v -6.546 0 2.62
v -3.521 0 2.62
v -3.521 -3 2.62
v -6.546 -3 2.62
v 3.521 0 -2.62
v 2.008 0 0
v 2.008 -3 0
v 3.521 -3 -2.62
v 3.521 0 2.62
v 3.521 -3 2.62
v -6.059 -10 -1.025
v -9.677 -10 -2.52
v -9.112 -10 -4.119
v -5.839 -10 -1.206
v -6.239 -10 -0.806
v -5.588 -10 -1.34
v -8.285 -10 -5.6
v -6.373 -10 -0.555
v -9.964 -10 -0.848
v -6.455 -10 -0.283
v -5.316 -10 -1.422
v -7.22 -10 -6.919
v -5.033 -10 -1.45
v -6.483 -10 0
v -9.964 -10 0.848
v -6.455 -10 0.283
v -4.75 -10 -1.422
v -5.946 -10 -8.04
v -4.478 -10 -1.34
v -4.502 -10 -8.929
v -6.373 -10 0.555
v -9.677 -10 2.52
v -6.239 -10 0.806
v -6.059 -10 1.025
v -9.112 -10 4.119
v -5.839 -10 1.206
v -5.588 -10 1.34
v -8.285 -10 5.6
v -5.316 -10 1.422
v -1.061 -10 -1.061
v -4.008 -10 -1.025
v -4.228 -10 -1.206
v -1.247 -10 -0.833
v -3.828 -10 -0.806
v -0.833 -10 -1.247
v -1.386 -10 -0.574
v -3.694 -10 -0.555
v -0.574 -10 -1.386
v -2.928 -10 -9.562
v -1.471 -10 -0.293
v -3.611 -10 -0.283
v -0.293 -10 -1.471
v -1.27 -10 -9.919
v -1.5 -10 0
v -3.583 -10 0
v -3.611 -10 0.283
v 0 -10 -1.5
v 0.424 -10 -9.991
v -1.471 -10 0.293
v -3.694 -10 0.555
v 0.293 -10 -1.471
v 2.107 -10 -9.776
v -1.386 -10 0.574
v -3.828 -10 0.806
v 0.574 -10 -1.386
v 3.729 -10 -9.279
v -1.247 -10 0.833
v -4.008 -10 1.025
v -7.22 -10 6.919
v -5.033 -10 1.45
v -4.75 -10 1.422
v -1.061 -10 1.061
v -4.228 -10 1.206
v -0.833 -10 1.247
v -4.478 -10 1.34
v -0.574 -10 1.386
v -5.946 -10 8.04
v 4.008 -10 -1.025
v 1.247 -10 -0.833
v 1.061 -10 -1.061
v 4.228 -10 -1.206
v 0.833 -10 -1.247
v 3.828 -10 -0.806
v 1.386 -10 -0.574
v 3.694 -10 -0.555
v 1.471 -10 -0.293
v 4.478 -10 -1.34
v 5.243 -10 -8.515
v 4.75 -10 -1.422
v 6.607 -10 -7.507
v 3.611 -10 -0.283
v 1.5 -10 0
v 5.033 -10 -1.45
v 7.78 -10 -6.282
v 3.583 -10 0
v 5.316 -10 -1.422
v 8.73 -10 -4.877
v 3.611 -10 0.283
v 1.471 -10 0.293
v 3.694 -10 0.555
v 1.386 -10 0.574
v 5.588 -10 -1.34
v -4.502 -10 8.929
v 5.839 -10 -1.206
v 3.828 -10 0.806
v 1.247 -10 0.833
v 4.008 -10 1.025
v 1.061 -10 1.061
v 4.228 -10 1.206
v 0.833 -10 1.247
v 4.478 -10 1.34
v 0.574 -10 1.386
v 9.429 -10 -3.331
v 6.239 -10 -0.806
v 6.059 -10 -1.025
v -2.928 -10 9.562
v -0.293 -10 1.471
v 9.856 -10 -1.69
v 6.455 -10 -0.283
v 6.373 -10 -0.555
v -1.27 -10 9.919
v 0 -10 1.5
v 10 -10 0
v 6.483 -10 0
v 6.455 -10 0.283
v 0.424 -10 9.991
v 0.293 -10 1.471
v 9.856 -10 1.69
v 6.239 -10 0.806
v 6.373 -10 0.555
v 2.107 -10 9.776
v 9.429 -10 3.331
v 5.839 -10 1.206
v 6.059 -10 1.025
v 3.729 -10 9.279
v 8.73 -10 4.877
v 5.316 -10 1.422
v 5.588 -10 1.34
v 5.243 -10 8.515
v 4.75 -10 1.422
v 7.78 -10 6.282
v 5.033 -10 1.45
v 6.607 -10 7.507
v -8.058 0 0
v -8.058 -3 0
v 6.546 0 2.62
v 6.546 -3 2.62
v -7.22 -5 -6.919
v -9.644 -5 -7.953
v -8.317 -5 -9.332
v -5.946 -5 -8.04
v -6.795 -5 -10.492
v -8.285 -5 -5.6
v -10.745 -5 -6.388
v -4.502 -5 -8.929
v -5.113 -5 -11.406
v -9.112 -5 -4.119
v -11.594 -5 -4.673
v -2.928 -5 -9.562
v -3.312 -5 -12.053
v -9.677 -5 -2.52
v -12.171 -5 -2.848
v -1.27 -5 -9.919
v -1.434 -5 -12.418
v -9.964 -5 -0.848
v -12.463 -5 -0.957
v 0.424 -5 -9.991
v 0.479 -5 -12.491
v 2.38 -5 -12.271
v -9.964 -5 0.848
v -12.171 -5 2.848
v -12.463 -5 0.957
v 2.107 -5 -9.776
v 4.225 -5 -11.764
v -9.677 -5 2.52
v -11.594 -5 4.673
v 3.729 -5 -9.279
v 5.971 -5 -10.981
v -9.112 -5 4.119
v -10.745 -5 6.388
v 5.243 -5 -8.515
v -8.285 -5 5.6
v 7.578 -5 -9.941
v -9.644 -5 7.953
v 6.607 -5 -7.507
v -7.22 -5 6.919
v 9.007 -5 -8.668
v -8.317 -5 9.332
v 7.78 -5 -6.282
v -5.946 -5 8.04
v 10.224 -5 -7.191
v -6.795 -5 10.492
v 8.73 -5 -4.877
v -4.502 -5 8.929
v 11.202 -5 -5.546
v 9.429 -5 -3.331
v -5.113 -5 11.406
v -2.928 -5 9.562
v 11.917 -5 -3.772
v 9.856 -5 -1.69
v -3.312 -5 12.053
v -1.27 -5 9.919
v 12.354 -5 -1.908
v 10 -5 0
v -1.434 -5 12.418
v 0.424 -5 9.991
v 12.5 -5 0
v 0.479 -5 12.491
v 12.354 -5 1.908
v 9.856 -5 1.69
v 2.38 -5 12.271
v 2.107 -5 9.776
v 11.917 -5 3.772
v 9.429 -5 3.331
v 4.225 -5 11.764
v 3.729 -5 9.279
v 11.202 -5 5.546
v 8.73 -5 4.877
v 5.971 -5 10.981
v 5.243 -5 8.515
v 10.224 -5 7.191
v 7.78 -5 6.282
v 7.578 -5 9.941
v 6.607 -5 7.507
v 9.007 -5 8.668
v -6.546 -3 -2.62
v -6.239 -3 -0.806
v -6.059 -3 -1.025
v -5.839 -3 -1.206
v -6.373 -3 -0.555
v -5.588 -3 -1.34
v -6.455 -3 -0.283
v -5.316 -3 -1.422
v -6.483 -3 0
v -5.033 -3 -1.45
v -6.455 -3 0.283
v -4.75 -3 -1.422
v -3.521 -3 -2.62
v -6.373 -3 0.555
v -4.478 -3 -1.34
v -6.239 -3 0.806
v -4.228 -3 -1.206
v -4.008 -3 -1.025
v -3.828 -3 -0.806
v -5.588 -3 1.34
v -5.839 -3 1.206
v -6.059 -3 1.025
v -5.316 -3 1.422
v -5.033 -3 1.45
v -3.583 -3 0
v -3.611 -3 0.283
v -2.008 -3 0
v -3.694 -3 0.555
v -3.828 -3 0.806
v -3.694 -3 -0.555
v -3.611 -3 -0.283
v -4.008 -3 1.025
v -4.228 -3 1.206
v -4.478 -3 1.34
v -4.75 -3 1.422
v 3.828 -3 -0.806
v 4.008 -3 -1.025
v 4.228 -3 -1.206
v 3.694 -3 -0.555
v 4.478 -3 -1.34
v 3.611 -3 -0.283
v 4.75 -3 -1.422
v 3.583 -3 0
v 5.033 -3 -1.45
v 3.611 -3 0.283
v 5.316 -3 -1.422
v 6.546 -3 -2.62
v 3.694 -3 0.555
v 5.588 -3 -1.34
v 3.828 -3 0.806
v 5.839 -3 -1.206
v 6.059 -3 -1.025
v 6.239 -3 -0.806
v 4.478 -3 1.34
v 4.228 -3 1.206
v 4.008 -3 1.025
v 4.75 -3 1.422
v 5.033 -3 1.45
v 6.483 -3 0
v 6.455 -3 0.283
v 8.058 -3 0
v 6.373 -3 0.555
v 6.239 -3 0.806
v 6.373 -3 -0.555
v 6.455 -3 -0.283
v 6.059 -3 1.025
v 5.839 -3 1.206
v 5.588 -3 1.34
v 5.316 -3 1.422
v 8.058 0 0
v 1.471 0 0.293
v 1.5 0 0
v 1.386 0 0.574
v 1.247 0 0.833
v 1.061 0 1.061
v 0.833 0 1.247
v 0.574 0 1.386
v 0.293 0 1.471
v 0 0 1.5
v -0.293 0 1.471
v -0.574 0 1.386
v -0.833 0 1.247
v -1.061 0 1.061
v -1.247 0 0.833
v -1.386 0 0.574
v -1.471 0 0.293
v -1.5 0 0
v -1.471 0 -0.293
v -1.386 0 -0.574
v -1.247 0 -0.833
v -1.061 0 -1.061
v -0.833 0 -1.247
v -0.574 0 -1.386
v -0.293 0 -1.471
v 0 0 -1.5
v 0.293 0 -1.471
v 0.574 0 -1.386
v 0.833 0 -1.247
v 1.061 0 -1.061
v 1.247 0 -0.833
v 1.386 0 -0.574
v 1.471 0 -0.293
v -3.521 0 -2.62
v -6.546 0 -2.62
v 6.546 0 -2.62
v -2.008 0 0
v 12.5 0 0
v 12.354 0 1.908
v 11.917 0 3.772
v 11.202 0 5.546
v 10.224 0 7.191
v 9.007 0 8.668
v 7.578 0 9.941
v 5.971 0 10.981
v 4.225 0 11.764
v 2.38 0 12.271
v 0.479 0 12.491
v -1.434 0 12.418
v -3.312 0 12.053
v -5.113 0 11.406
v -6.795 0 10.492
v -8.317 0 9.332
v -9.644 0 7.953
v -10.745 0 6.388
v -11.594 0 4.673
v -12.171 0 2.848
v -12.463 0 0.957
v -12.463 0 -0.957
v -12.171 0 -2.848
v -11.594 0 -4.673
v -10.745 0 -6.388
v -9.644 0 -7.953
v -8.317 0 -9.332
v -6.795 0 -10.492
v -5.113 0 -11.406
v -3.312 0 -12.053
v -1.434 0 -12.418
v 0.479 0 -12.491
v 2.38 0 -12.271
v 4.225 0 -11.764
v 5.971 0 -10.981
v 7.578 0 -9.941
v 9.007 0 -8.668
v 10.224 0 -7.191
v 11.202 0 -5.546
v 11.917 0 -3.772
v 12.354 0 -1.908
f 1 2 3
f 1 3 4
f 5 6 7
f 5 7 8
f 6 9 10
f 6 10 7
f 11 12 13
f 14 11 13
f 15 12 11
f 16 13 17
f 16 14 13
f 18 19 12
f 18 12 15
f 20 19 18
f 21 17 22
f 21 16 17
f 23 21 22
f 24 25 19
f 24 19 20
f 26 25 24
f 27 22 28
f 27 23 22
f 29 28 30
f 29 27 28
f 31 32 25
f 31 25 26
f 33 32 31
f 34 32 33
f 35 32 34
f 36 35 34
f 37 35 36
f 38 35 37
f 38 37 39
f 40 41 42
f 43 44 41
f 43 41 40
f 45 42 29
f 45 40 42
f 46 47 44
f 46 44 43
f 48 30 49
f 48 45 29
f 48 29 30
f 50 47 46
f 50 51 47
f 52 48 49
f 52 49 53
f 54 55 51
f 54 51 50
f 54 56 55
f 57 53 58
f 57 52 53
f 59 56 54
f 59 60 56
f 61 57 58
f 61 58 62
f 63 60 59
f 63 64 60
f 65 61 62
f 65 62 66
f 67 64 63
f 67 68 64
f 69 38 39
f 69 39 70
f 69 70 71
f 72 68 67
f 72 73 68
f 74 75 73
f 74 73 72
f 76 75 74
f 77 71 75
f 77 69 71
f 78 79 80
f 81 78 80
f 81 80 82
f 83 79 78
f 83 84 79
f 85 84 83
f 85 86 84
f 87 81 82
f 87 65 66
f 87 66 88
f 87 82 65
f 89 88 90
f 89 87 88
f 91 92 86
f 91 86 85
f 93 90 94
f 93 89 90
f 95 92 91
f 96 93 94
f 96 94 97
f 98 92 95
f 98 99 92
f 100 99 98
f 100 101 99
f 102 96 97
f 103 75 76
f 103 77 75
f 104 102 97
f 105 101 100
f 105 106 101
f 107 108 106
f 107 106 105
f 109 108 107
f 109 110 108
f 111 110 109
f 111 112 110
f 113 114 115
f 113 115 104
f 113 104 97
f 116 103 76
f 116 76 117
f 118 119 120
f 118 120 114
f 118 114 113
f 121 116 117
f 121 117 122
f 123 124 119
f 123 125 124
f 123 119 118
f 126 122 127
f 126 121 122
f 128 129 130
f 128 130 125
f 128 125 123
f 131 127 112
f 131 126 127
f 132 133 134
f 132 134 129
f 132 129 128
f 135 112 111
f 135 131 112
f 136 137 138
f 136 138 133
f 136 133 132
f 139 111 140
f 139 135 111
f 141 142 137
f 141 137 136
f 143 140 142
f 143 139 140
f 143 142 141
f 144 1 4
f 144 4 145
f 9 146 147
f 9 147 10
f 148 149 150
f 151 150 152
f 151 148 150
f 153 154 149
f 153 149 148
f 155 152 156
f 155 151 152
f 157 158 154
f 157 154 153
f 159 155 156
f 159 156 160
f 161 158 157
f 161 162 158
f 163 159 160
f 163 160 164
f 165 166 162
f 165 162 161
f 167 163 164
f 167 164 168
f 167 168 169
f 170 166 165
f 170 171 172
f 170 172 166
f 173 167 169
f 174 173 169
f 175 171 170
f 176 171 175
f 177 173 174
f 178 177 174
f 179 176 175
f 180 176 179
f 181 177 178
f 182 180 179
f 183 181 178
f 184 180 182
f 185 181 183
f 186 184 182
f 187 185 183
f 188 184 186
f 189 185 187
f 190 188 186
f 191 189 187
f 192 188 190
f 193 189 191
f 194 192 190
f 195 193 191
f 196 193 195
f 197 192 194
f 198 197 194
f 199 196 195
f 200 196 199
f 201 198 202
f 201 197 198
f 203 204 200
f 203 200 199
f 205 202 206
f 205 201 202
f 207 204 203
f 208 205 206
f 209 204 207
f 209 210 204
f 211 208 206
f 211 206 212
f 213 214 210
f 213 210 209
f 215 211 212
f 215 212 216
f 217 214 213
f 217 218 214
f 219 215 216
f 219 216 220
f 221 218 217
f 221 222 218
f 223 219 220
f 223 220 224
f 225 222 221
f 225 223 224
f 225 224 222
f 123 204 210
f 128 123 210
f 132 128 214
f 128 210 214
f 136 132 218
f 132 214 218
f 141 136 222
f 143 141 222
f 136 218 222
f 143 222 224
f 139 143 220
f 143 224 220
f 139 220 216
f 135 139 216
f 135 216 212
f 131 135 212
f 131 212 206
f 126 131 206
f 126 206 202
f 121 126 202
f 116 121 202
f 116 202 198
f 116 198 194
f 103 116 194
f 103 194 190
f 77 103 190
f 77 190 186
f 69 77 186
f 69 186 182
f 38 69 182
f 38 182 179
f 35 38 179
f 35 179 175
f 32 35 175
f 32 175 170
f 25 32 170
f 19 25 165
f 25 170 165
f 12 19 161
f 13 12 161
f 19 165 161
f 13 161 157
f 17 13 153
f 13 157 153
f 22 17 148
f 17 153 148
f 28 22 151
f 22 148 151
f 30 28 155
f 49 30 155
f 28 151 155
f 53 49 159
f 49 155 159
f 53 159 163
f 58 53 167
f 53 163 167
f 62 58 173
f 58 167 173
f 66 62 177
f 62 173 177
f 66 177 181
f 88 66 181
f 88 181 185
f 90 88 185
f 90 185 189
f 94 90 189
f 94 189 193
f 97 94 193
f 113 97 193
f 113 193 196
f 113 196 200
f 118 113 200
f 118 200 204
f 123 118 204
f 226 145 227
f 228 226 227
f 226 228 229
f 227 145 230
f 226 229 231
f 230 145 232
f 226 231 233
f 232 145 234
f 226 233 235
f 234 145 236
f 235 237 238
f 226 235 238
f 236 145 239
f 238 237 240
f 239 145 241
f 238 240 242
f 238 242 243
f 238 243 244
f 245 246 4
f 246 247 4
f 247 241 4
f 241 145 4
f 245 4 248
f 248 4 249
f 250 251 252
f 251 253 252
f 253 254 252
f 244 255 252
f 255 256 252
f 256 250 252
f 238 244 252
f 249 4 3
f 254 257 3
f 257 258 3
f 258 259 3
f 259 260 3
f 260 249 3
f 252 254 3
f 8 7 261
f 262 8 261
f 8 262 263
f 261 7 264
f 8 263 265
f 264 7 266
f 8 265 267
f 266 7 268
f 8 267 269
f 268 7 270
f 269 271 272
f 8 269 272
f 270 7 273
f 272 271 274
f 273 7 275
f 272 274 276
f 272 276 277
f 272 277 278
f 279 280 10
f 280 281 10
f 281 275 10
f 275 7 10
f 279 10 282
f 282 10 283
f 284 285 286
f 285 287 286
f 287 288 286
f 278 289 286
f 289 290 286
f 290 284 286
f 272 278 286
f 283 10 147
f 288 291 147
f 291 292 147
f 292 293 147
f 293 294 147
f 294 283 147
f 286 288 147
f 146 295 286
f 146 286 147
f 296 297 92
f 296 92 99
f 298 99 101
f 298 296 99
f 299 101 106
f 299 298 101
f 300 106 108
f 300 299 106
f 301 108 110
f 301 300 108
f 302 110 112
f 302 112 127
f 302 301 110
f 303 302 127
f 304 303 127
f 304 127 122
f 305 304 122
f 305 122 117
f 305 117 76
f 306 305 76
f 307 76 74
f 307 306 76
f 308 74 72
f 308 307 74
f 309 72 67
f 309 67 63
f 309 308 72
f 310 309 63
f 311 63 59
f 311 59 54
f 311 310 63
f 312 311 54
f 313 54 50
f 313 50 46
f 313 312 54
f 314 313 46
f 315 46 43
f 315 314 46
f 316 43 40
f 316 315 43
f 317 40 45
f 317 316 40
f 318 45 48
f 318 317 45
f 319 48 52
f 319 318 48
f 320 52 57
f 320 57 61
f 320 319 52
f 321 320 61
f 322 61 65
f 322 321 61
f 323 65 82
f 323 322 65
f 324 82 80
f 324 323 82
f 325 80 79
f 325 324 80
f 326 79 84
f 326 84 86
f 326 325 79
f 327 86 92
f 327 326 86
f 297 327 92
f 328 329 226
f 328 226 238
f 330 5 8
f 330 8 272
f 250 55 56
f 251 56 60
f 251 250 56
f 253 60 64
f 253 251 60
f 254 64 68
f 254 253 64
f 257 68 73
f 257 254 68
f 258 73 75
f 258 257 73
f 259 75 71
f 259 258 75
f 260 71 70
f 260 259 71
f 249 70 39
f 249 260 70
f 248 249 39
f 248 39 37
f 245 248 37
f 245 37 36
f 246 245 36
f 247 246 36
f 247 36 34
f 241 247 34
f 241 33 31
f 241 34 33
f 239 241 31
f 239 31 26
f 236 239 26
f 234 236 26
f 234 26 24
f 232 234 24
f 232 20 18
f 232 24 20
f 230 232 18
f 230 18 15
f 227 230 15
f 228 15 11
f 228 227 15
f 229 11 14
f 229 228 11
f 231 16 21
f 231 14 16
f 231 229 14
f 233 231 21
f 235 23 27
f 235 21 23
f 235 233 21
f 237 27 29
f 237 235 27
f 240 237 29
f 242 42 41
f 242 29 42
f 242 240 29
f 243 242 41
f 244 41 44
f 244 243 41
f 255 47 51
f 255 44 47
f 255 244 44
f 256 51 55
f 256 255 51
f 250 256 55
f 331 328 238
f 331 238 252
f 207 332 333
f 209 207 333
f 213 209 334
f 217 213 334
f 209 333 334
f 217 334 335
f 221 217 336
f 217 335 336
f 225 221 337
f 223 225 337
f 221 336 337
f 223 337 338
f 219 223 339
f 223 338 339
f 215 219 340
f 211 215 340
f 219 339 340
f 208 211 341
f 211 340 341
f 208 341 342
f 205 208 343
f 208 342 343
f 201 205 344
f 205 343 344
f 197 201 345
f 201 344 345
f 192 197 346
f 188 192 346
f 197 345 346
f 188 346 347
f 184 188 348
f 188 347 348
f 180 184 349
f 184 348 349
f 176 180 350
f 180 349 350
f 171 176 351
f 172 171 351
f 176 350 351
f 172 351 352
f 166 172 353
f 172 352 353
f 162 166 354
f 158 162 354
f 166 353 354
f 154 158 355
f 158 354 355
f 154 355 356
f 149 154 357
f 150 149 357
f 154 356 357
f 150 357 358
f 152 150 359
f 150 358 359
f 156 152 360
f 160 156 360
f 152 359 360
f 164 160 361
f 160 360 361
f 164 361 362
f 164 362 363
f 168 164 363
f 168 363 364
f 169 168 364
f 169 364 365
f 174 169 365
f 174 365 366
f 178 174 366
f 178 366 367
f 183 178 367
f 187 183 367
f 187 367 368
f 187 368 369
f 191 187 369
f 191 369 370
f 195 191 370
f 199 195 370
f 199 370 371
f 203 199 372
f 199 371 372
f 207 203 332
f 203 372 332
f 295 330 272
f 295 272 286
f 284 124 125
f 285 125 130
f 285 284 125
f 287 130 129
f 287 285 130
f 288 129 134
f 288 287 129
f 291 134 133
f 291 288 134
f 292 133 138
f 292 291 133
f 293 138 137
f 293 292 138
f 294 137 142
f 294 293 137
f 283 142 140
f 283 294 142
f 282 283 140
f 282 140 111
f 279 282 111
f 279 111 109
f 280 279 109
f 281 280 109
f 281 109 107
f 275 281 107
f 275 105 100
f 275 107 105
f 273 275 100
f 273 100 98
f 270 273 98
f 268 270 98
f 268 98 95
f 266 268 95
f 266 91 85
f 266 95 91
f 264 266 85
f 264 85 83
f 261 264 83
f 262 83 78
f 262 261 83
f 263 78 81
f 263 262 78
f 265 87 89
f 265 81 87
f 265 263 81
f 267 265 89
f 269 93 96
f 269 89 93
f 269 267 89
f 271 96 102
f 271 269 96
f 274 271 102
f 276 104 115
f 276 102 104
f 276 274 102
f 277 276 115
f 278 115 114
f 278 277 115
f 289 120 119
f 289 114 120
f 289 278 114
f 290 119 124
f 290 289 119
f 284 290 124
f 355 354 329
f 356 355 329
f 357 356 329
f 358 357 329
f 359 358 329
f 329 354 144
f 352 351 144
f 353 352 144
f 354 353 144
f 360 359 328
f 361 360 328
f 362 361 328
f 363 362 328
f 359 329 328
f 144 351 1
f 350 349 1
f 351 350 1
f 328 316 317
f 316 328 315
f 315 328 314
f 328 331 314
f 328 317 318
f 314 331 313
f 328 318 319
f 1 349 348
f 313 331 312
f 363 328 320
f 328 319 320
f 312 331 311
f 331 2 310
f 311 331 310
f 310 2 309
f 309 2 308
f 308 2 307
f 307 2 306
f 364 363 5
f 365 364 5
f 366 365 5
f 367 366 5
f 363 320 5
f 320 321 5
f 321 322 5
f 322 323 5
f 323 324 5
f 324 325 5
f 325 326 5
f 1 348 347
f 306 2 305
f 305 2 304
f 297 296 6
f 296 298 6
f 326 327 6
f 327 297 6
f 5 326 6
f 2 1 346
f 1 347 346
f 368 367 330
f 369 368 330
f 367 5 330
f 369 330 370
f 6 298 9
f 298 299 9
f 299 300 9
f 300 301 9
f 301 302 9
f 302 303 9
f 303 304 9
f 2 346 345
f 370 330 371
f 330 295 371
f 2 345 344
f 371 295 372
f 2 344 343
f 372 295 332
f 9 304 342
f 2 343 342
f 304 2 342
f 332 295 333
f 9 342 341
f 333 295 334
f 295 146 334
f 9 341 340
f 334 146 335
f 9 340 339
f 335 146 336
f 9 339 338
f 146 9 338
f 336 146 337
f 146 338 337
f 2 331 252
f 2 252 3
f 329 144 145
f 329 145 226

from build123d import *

# Parameters (mm, degrees)
F0_R     = 12.5
F0_R_2   = 10
F1_DEPTH = 5
F0_R_3   = 1.5
F2_DEPTH = 10
F3_R     = 1.45
F4_DEPTH = 25
F5_DEPTH = 25
F6_DEPTH = 3


with BuildPart() as f1:
    # F0 (on Front) → F1 (new body)
    with BuildSketch(Plane.XZ):
        Circle(F0_R)
        Circle(F0_R_2, mode=Mode.SUBTRACT)
    extrude(amount=F1_DEPTH)

    # F0 (on Front) → F2 (join)
    with BuildSketch(Plane.XZ):
        Circle(F0_R_2)
        Circle(F0_R_3, mode=Mode.SUBTRACT)
    extrude(amount=F2_DEPTH)

    # F3 (on Front) → F4 (cut)
    with BuildSketch(Plane.XZ):
        with Locations((-5.033278, 0)):
            Circle(F3_R)
    extrude(amount=F4_DEPTH, mode=Mode.SUBTRACT)

    # F3 (on Front) → F5 (cut)
    with BuildSketch(Plane.XZ):
        with Locations((5.033278, 0)):
            Circle(F3_R)
    extrude(amount=F5_DEPTH, mode=Mode.SUBTRACT)

    # F3 (on Front) → F6 (cut)
    with BuildSketch(Plane.XZ):
        Polygon((-6.545778, -2.619727), (-3.520778, -2.619727), (-2.008278, 0), (-3.520778, 2.619727), (-6.545778, 2.619727), (-8.058278, 0), align=None)
        with Locations((-5.033278, 0)):
            Circle(F3_R, mode=Mode.SUBTRACT)
        Polygon((6.545778, -2.619727), (8.058278, 0), (6.545778, 2.619727), (3.520778, 2.619727), (2.008278, 0), (3.520778, -2.619727), align=None)
        with Locations((5.033278, 0)):
            Circle(F3_R, mode=Mode.SUBTRACT)
    extrude(amount=F6_DEPTH, mode=Mode.SUBTRACT)


solid = f1.part
